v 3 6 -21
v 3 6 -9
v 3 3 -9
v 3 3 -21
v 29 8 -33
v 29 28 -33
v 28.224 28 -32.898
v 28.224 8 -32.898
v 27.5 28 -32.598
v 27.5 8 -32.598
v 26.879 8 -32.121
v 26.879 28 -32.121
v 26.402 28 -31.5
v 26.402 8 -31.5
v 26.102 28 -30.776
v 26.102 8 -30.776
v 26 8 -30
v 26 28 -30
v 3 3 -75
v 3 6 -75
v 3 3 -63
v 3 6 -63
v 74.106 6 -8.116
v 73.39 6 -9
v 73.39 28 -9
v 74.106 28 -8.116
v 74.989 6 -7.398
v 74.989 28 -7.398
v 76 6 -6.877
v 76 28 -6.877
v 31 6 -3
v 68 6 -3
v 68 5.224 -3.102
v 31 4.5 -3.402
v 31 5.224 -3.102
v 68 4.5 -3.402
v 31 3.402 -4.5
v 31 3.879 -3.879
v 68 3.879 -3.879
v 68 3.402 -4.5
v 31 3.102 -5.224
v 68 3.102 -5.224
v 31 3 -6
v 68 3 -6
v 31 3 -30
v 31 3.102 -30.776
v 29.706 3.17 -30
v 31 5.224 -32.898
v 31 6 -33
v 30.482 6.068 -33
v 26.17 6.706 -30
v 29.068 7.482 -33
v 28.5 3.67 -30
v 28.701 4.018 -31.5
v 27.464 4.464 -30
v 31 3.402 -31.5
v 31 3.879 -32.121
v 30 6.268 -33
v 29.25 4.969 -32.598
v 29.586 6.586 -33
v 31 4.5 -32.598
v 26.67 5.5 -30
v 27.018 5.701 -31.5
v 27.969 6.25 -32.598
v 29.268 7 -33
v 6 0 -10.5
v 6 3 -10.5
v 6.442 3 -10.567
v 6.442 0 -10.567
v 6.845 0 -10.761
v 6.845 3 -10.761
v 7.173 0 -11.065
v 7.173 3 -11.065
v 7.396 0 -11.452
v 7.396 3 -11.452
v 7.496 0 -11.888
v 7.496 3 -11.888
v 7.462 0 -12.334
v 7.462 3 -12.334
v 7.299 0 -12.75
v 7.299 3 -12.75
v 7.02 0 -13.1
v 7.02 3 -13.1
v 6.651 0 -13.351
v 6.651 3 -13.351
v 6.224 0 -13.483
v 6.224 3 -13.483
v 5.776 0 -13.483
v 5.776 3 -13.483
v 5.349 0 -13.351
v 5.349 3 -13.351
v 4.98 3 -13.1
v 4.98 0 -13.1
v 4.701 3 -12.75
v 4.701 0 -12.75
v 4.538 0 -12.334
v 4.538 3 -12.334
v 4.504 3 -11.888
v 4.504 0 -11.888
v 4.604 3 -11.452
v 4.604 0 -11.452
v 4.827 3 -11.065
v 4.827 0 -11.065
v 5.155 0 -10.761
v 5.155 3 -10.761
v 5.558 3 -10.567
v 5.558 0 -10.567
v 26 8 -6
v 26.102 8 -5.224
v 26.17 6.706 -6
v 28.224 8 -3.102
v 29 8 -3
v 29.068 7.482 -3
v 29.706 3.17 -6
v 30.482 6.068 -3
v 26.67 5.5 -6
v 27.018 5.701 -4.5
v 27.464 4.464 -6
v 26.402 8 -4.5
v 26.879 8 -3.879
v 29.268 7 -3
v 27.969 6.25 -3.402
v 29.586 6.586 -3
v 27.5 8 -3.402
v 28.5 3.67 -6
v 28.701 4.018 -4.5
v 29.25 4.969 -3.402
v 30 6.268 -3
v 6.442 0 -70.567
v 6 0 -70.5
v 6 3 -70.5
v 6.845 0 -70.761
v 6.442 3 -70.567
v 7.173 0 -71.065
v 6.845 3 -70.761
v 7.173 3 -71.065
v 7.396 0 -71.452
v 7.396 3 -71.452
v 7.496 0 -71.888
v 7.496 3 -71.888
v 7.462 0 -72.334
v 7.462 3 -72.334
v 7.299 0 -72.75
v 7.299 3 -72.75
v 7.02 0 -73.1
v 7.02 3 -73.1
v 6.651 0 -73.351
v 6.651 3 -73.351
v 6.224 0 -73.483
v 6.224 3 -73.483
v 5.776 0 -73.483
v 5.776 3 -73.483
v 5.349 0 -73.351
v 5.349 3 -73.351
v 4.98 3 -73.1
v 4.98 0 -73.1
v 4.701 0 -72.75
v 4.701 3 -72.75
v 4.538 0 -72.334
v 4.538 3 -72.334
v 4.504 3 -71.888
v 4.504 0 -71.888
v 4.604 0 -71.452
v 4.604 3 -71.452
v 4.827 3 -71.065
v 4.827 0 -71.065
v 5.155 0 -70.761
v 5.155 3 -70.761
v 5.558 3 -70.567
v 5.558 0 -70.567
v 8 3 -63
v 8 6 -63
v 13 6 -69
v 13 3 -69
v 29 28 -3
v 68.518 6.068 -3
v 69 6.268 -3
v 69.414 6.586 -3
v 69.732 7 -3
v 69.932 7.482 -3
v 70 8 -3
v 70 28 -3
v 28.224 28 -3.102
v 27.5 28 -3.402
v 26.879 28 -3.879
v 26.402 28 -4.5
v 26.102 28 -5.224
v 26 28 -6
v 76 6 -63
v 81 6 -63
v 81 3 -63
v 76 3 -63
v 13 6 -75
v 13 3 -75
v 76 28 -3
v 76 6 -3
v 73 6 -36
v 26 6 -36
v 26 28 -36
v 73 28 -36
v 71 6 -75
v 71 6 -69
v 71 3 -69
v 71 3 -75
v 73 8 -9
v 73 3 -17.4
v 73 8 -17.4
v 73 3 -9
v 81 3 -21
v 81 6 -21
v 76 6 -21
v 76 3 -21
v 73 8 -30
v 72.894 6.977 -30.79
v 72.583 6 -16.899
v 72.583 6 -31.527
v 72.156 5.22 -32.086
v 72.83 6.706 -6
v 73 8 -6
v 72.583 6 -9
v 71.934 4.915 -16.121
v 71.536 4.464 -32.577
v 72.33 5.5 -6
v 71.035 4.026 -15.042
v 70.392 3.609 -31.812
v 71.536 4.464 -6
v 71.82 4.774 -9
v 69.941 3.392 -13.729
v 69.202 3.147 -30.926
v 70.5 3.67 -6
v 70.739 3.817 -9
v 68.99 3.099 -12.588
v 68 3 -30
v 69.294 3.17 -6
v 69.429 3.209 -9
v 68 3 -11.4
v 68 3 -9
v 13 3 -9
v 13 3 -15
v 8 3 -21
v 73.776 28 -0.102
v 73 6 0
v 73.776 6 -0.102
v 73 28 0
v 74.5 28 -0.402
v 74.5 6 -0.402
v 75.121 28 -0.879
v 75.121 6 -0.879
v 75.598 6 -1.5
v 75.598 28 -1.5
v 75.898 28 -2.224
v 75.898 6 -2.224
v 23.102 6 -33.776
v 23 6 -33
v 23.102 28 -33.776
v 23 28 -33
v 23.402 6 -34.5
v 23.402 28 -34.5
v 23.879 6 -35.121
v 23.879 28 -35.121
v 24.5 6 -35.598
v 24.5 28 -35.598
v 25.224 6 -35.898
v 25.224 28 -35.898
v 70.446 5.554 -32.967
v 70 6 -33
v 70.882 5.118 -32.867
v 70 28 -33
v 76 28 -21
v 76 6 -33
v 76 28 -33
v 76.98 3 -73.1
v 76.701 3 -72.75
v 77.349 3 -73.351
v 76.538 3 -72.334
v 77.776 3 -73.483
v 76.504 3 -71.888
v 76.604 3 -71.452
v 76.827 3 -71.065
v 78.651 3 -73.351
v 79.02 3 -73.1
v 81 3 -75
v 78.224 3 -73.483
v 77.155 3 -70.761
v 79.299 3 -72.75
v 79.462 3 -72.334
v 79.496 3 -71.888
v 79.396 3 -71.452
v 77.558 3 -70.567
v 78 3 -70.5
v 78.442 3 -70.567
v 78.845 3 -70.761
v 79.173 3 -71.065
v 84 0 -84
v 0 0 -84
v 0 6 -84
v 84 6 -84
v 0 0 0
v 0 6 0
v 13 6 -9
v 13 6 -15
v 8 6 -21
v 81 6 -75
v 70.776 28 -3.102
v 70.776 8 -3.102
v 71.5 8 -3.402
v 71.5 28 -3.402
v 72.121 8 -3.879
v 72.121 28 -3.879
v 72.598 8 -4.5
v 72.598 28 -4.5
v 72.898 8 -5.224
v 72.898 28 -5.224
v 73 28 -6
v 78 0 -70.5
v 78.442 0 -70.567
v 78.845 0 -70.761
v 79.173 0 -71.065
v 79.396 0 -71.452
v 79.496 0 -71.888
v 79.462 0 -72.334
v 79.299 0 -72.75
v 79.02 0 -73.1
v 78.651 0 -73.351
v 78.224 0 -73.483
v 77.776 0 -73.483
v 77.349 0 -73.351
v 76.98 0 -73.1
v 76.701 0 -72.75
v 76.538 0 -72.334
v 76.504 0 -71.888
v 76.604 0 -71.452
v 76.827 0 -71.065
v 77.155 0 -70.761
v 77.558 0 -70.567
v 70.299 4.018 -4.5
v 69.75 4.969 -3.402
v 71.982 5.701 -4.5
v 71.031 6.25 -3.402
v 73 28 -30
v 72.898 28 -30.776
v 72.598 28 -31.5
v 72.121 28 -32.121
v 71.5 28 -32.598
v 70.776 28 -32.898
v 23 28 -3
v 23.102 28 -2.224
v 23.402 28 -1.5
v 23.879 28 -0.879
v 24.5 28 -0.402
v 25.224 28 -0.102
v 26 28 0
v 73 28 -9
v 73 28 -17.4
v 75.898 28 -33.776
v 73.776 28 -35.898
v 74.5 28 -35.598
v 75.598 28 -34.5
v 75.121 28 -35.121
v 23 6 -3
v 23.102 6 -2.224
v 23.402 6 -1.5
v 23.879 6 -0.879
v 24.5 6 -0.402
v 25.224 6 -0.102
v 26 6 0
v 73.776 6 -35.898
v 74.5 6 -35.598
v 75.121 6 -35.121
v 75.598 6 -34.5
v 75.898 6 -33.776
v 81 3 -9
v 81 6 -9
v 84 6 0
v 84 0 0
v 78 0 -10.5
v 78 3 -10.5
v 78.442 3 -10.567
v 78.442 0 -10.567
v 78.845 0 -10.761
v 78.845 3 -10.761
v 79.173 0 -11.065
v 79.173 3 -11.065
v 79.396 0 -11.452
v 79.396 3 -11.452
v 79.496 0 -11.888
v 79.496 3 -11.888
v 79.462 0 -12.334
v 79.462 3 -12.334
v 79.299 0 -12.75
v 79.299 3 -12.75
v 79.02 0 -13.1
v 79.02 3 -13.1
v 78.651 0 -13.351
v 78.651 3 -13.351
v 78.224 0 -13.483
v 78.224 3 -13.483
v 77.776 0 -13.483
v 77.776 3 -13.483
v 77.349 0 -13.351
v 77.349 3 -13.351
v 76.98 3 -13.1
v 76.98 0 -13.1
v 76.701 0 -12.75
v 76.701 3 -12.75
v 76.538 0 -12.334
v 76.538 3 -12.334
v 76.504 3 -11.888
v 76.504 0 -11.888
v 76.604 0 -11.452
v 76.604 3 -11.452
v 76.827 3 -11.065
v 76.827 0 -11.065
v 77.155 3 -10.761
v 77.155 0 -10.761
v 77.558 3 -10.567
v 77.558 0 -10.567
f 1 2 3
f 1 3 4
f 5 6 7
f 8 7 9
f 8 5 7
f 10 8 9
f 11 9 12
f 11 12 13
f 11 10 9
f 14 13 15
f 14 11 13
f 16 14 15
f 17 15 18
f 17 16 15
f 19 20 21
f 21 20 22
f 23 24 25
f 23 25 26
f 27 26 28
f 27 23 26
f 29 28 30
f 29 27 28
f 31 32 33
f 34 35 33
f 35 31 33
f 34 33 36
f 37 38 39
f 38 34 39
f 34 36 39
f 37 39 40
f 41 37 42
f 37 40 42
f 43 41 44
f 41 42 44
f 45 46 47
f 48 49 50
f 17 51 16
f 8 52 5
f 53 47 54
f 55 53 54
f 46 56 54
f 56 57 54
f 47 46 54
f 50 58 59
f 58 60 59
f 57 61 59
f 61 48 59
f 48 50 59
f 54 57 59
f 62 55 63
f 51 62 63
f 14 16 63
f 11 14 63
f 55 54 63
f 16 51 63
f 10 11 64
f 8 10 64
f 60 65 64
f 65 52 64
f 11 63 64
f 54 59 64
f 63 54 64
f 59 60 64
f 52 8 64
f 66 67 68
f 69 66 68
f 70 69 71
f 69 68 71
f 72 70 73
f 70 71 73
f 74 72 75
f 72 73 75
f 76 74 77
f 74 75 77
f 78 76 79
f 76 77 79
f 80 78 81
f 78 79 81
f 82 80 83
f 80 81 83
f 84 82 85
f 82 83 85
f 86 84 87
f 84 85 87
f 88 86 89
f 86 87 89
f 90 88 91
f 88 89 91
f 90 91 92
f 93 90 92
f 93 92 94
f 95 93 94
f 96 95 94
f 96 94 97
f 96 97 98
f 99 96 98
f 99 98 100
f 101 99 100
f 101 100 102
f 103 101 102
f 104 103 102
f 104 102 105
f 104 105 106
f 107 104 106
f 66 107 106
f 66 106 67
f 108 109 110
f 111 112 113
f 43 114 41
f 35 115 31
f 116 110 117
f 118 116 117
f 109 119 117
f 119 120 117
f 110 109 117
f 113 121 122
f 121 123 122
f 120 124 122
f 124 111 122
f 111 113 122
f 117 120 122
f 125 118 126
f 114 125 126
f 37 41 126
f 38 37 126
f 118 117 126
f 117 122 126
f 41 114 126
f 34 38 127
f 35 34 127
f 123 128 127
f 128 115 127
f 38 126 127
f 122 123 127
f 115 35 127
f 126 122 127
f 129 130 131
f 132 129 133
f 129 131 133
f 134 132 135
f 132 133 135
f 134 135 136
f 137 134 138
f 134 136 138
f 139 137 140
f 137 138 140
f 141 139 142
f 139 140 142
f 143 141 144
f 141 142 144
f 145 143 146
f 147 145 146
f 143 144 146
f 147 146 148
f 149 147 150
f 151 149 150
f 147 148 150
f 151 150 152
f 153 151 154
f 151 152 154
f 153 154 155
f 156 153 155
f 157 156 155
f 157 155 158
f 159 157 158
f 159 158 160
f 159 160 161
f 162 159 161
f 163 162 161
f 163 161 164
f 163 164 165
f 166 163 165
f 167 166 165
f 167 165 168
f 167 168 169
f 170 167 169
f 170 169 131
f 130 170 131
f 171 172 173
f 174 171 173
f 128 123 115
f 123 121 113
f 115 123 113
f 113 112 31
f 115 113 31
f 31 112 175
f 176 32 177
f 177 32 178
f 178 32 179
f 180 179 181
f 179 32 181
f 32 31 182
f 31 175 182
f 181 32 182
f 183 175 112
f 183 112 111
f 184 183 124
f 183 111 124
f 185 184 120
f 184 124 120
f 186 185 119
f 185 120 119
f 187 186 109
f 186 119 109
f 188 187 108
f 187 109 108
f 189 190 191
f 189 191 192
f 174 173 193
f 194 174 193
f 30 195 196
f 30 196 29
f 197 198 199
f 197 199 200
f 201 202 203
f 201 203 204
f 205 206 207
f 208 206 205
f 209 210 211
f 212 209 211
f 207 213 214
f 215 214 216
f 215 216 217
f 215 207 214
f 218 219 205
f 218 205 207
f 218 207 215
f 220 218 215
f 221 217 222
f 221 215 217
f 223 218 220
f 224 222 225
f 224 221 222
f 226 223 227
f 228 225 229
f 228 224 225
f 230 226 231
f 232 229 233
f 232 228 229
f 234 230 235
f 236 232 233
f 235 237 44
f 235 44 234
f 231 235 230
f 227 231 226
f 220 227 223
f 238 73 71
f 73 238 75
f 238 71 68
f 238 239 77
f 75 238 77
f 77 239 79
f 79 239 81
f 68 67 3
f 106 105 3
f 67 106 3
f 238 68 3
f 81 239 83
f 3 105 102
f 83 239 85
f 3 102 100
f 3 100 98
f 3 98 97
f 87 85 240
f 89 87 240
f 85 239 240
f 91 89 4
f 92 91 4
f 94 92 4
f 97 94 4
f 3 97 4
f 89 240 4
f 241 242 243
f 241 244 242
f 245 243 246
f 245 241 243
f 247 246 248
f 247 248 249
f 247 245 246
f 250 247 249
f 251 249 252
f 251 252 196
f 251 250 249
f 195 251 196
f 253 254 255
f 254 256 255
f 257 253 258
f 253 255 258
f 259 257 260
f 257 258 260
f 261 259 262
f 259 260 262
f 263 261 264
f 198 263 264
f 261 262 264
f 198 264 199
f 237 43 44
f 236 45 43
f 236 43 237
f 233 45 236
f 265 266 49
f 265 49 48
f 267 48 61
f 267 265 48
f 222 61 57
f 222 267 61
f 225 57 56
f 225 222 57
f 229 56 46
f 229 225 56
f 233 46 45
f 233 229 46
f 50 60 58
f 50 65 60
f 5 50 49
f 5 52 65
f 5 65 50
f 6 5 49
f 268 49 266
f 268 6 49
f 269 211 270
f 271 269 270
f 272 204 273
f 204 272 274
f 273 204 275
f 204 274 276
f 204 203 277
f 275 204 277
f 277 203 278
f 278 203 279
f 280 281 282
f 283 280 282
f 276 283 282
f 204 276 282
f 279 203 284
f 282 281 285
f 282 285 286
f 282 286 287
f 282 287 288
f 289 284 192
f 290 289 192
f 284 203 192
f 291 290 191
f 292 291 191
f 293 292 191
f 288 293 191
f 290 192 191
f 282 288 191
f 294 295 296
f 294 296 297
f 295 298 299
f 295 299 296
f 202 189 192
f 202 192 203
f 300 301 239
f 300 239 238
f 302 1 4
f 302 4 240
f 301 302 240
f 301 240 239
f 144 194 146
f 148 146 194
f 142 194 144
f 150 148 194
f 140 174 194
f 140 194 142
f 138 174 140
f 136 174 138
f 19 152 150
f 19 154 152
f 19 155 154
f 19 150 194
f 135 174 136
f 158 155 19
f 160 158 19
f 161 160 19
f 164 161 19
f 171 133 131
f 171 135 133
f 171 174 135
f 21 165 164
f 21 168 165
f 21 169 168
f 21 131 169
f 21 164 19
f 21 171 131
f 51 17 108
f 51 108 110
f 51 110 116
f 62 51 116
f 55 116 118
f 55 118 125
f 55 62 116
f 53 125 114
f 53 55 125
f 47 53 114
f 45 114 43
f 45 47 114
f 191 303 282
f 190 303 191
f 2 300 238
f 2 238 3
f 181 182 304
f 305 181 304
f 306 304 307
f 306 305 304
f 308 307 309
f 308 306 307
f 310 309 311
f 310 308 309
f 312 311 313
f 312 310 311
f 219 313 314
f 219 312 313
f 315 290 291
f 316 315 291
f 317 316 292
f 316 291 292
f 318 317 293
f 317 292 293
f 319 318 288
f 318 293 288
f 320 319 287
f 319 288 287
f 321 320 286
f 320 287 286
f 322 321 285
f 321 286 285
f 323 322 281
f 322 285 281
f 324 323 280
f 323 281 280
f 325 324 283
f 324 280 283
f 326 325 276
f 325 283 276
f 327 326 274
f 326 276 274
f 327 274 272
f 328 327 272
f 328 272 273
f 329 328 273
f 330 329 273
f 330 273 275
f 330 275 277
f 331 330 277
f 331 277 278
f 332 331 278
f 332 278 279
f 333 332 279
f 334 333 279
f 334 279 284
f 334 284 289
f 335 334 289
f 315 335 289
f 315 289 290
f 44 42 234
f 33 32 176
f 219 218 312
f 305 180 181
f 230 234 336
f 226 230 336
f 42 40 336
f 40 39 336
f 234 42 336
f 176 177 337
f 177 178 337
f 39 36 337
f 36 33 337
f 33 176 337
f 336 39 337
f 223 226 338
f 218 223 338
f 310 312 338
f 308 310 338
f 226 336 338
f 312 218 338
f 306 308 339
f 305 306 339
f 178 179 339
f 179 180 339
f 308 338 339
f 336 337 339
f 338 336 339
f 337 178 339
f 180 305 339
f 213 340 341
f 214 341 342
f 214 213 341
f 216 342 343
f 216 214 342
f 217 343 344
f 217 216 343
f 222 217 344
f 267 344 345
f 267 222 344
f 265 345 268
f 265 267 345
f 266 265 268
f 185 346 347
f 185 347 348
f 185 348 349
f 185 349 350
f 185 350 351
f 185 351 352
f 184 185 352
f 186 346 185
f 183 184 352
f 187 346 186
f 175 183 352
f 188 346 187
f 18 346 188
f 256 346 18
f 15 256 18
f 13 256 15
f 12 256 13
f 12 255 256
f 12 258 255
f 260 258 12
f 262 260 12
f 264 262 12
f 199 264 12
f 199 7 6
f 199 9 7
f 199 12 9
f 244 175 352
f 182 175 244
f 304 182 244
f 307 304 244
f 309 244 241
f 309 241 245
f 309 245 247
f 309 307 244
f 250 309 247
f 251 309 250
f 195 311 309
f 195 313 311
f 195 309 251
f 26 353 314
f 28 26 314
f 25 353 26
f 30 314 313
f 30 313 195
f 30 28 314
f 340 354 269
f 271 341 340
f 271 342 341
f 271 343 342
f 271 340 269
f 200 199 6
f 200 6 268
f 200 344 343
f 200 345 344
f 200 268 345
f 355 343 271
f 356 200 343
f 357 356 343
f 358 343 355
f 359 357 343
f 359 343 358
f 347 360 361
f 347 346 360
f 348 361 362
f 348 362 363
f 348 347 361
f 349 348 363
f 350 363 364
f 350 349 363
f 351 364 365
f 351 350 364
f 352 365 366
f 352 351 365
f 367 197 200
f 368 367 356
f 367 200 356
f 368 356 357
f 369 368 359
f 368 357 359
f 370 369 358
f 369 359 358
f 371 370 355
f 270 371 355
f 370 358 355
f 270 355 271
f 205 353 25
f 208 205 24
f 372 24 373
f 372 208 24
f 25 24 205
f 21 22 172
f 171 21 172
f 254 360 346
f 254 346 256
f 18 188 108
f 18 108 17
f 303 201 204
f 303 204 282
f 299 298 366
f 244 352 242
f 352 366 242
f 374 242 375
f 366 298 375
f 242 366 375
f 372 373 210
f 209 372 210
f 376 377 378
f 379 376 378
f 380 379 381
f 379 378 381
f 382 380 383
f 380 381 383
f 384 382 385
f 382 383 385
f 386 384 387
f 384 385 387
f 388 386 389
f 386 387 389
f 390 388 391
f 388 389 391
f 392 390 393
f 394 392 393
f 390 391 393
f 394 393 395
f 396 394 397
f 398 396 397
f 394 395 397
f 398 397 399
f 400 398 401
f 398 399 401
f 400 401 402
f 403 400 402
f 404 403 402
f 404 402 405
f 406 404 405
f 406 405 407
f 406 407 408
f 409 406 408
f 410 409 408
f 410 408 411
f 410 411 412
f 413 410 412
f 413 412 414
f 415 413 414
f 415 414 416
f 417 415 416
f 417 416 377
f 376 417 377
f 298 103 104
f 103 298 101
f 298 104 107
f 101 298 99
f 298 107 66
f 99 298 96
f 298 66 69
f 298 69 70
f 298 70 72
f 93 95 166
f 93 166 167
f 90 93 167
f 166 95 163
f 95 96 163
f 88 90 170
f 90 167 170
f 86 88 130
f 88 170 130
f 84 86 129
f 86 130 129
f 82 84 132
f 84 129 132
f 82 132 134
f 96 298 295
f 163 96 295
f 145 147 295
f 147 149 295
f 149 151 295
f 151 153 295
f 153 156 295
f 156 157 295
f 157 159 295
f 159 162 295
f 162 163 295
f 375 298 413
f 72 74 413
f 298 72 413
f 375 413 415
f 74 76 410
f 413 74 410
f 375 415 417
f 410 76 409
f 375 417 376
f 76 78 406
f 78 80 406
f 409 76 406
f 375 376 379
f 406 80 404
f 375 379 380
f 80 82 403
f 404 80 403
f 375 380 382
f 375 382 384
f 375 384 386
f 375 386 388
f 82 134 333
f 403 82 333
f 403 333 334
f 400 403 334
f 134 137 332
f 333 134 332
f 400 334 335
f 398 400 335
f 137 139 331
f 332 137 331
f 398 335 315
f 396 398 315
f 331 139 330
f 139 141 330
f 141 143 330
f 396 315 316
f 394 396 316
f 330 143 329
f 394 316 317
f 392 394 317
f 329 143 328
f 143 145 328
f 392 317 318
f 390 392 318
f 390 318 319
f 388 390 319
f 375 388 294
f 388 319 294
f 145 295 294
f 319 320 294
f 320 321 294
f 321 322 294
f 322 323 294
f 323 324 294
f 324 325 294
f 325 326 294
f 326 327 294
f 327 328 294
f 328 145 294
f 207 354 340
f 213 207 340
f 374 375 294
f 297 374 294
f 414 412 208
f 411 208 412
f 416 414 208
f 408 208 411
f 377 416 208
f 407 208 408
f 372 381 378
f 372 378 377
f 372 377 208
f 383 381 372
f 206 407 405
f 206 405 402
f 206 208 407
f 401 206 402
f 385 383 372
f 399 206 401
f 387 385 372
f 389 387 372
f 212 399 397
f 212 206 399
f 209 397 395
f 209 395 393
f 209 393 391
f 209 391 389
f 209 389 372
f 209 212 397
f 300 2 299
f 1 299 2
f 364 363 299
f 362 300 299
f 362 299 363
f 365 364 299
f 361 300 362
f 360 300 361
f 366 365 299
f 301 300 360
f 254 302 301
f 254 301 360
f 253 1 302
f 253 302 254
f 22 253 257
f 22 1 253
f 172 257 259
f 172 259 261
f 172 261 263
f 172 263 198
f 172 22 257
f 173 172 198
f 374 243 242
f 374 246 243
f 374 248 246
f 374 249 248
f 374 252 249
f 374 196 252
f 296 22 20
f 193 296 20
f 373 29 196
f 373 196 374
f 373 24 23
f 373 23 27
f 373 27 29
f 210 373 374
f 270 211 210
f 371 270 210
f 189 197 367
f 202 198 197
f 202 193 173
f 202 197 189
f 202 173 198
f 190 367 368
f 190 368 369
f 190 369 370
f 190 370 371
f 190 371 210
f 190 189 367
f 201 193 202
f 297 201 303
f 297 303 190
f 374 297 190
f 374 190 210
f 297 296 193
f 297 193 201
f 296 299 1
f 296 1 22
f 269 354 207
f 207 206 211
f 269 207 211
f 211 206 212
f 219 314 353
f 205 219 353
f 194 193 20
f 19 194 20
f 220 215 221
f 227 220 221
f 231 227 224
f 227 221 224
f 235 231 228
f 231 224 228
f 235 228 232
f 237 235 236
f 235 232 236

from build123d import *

# Parameters (mm, degrees)
SKETCH1_W               = 84
SKETCH1_H               = 84
BOSS_EXTRUDE1_DEPTH     = 6
SKETCH2_R               = 1.5
CUT_EXTRUDE1_DEPTH      = 119.94536561
SKETCH4_R               = 1.5
CUT_EXTRUDE4_DEPTH      = 3
MIRROR3_COPY_1_SKETCH_R = 1.5
MIRROR3_COPY_1_DEPTH    = 3
SKETCH5_W               = 53
SKETCH5_H               = 36
BOSS_EXTRUDE2_DEPTH     = 22
SKETCH6_W               = 47
SKETCH6_H               = 30
CUT_EXTRUDE5_DEPTH      = 25
FILLET1_R               = 3
FILLET2_R               = 5
BOSS_EXTRUDE3_START     = -17.4
BOSS_EXTRUDE3_DEPTH     = 8.4
CUT_EXTRUDE14_START     = -22
CUT_EXTRUDE14_DEPTH     = 22
CUT_EXTRUDE15_DEPTH     = 122.396046085


# Read off the part's stored shape, not the designer's step: Boss-Extrude3
with BuildPart() as part:
    # Sketch1 → Boss-Extrude1 (new body)
    with BuildSketch(Plane(origin=(0, 0, 0), x_dir=(1, 0, 0), z_dir=(0, 1, 0))):
        with Locations((42, 42)):
            Rectangle(SKETCH1_W, SKETCH1_H)
    extrude(amount=BOSS_EXTRUDE1_DEPTH)

    # Sketch2 → Cut-Extrude1 (cut, through all)
    with BuildSketch(Plane(origin=(0, 6, 0), x_dir=(1, 0, 0), z_dir=(0, 1, 0))):
        with Locations(Location((6, 72, 0), (0, 0, 270))):
            Circle(SKETCH2_R)
        with Locations(Location((6, 12, 0), (0, 0, 270))):
            Circle(SKETCH2_R)
        with Locations(Location((78, 12, 0), (0, 0, 270))):
            Circle(SKETCH2_R)
        with Locations(Location((78, 72, 0), (0, 0, 270))):
            Circle(SKETCH2_R)
    extrude(amount=-CUT_EXTRUDE1_DEPTH, mode=Mode.SUBTRACT)

    # Sketch4 → Cut-Extrude4 (cut)
    with BuildSketch(Plane(origin=(0, 6, 0), x_dir=(1, 0, 0), z_dir=(0, 1, 0))):
        Polygon((13, 15), (13, 9), (3, 9), (3, 21), (8, 21), align=None)
        with Locations(Location((6, 12, 0), (0, 0, 270))):
            Circle(SKETCH4_R, mode=Mode.SUBTRACT)
    cut_extrude4 = extrude(amount=-CUT_EXTRUDE4_DEPTH, mode=Mode.SUBTRACT)

    # Mirror2: Cut-Extrude4 across plane
    add(cut_extrude4.mirror(Plane.XY.offset(-42)), mode=Mode.SUBTRACT)

    # Mirror3: Cut-Extrude4 across plane
    add(cut_extrude4.mirror(Plane.ZY.offset(-42)), mode=Mode.SUBTRACT)

    # Mirror3 copy 1 sketch → Mirror3 copy 1 (cut)
    with BuildSketch(Plane(origin=(84, 6, -84), x_dir=(-1, 0, 0), z_dir=(0, 1, 0))):
        Polygon((13, 15), (13, 9), (3, 9), (3, 21), (8, 21), align=None)
        with Locations(Location((6, 12, 0), (0, 0, 270))):
            Circle(MIRROR3_COPY_1_SKETCH_R, mode=Mode.SUBTRACT)
    extrude(amount=-MIRROR3_COPY_1_DEPTH, mode=Mode.SUBTRACT)

    # Sketch5 → Boss-Extrude2 (add)
    with BuildSketch(Plane(origin=(0, 6, 0), x_dir=(1, 0, 0), z_dir=(0, 1, 0))):
        with Locations((49.5, 18)):
            Rectangle(SKETCH5_W, SKETCH5_H)
    extrude(amount=BOSS_EXTRUDE2_DEPTH)

    # Sketch6 → Cut-Extrude5 (cut)
    with BuildSketch(Plane(origin=(0, 28, 0), x_dir=(1, 0, 0), z_dir=(0, 1, 0))):
        with Locations((49.5, 18)):
            Rectangle(SKETCH6_W, SKETCH6_H)
    extrude(amount=-CUT_EXTRUDE5_DEPTH, mode=Mode.SUBTRACT)

    # Fillet1
    fillet1_edges = [part.edges().sort_by_distance(p)[0] for p in [
        (76, 17, -36),
        (23, 17, -36),
        (23, 17, 0),
        (76, 17, 0),
        (73, 15.5, -33),
        (49.5, 3, -3),
        (73, 15.5, -3),
        (26, 15.5, -3),
        (49.5, 3, -33),
        (26, 15.5, -33),
    ]]
    fillet(fillet1_edges, radius=FILLET1_R)

    # Fillet2
    # the kernel refuses this fillet: 5 mm, written as the material it adds along each edge
    with BuildSketch(Plane(origin=(31, 8, -3), x_dir=(-1, 0, 0), z_dir=(0, 1, 0))) as fillet2_piece_1:
        with BuildLine():
            CenterArc((2, -3), 3, 0, 90)
            Line((5, -3), (5, 0))
            Line((5, 0), (2, 0))
        make_face()
    revolve(axis=Axis((31, 8, -3), (0, 0, 1)), revolution_arc=90)
    with BuildSketch(Plane(origin=(31, 8, -33), x_dir=(0, -1, 0), z_dir=(1, 0, 0))) as fillet2_piece_2:
        with BuildLine():
            CenterArc((2, -3), 3, 0, 90)
            Line((5, -3), (5, 0))
            Line((5, 0), (2, 0))
        make_face()
    revolve(axis=Axis((31, 8, -33), (0, 0, -1)), revolution_arc=90)
    with BuildSketch(Plane(origin=(68, 8, -3), x_dir=(0, -1, 0), z_dir=(-1, 0, 0))) as fillet2_piece_3:
        with BuildLine():
            CenterArc((2, -3), 3, 0, 90)
            Line((5, -3), (5, 0))
            Line((5, 0), (2, 0))
        make_face()
    revolve(axis=Axis((68, 8, -3), (0, 0, 1)), revolution_arc=90)
    with BuildSketch(Plane(origin=(73, 3, -4.9), x_dir=(-1, 0, 0), z_dir=(0, 0, -1))) as fillet2_piece_4_section:
        with BuildLine():
            CenterArc((FILLET2_R, FILLET2_R), FILLET2_R, 180, 90)
            Line((0, FILLET2_R), (0, 0))
            Line((0, 0), (FILLET2_R, 0))
        make_face()
    fillet2_piece_4 = extrude(amount=37.6, mode=Mode.PRIVATE)
    fillet2_piece_4 = split(fillet2_piece_4, bisect_by=Plane(origin=(71.840443932, 4.051726495, -9), z_dir=(0, 0, 1)), keep=Keep.TOP, mode=Mode.PRIVATE)
    add(fillet2_piece_4)
    with BuildSketch(Plane(origin=(73, 3, -4.9), x_dir=(-1, 0, 0), z_dir=(0, 0, -1))) as fillet2_piece_5_section:
        with BuildLine():
            CenterArc((FILLET2_R, FILLET2_R), FILLET2_R, 180, 90)
            Line((0, FILLET2_R), (0, 0))
            Line((0, 0), (FILLET2_R, 0))
        make_face()
    fillet2_piece_5 = extrude(amount=37.6, mode=Mode.PRIVATE)
    fillet2_piece_5 = split(fillet2_piece_5, bisect_by=Plane(origin=(72.877053979, 6.49875804, -36), z_dir=(0, 0, 1)), keep=Keep.TOP, mode=Mode.PRIVATE)
    fillet2_piece_5 = split(fillet2_piece_5, bisect_by=Plane(origin=(72.877053979, 6, -13.126232387), z_dir=(0, 1, 0)), keep=Keep.TOP, mode=Mode.PRIVATE)
    add(fillet2_piece_5)
    with BuildSketch(Plane(origin=(73, 3, -4.9), x_dir=(-1, 0, 0), z_dir=(0, 0, -1))) as fillet2_piece_6_section:
        with BuildLine():
            CenterArc((FILLET2_R, FILLET2_R), FILLET2_R, 180, 90)
            Line((0, FILLET2_R), (0, 0))
            Line((0, 0), (FILLET2_R, 0))
        make_face()
    fillet2_piece_6 = extrude(amount=37.6, mode=Mode.PRIVATE)
    fillet2_piece_6 = split(fillet2_piece_6, bisect_by=Plane(origin=(74.593810092, 3.935909556, -19.312572111), z_dir=(-0.7682212795973755, 0, -0.6401843996644804)), keep=Keep.TOP, mode=Mode.PRIVATE)
    fillet2_piece_6 = split(fillet2_piece_6, bisect_by=Plane(origin=(71.754876355, 6, -21.678350226), z_dir=(0, -1, 0)), keep=Keep.TOP, mode=Mode.PRIVATE)
    add(fillet2_piece_6)
    with BuildSketch(Plane(origin=(73, 3, -3), x_dir=(-1, 0, 0), z_dir=(0, 0, -1))) as fillet2_piece_7:
        with BuildLine():
            CenterArc((FILLET2_R, FILLET2_R), FILLET2_R, 180, 90)
            Line((0, FILLET2_R), (0, 0))
            Line((0, 0), (FILLET2_R, 0))
        make_face()
    extrude(amount=6)
    with BuildSketch(Plane(origin=(73, 3, -3), x_dir=(-1, 0, 0), z_dir=(0, 0, -1))) as fillet2_piece_8_section:
        with BuildLine():
            CenterArc((FILLET2_R, FILLET2_R), FILLET2_R, 180, 90)
            Line((0, FILLET2_R), (0, 0))
            Line((0, 0), (FILLET2_R, 0))
        make_face()
    fillet2_piece_8 = extrude(amount=18.5, mode=Mode.PRIVATE)
    fillet2_piece_8 = split(fillet2_piece_8, bisect_by=Plane(origin=(72.877053979, 6, -13.126232386), z_dir=(0, 1, 0)), keep=Keep.TOP, mode=Mode.PRIVATE)
    add(fillet2_piece_8)
    with BuildSketch(Plane(origin=(73, 3, -3), x_dir=(-1, 0, 0), z_dir=(0, 0, -1))) as fillet2_piece_9_section:
        with BuildLine():
            CenterArc((FILLET2_R, FILLET2_R), FILLET2_R, 180, 90)
            Line((0, FILLET2_R), (0, 0))
            Line((0, 0), (FILLET2_R, 0))
        make_face()
    fillet2_piece_9 = extrude(amount=18.5, mode=Mode.PRIVATE)
    fillet2_piece_9 = split(fillet2_piece_9, bisect_by=Plane(origin=(73.049643728, 3.899661729, -17.459572473), z_dir=(-0.7682212795973755, 0, -0.6401843996644804)), keep=Keep.TOP, mode=Mode.PRIVATE)
    add(fillet2_piece_9)
    with BuildSketch(Plane(origin=(26, 3, -33), x_dir=(1, 0, 0), z_dir=(0, 0, 1))) as fillet2_piece_10:
        with BuildLine():
            CenterArc((FILLET2_R, FILLET2_R), FILLET2_R, 180, 90)
            Line((0, FILLET2_R), (0, 0))
            Line((0, 0), (FILLET2_R, 0))
        make_face()
    extrude(amount=30)

    # Boss-Extrude3 outline → Boss-Extrude3 (add)
    with BuildSketch(Plane.XY.offset(BOSS_EXTRUDE3_START)):
        with BuildLine():
            Line((73, 6), (72.582575695, 6))
            ThreePointArc((72.582575695, 6), (70.738612788, 3.816699867), (68, 3))
            Line((68, 3), (73, 3))
            Line((73, 3), (73, 6))
        make_face()
    extrude(amount=BOSS_EXTRUDE3_DEPTH)

    # Sketch8 → Cut-Extrude14 (cut)
    with BuildSketch(Plane(origin=(0, 28, 0), x_dir=(1, 0, 0), z_dir=(0, 1, 0)).offset(CUT_EXTRUDE14_START)):
        with BuildLine():
            Line((76, 9), (76, 17.123475383))
            ThreePointArc((76, 17.123475383), (74.22437799, 15.99933475), (73, 14.291287847))
            Line((73, 14.291287847), (73, 9.708712153))
            ThreePointArc((73, 9.708712153), (73.182064882, 9.347171095), (73.390227771, 9))
            Line((73.390227771, 9), (76, 9))
        make_face()
        with BuildLine():
            Line((76, 6.876524617), (76, 9))
            Line((76, 9), (73.390227771, 9))
            ThreePointArc((73.390227771, 9), (74.528752508, 7.733802531), (76, 6.876524617))
        make_face()
    extrude(amount=CUT_EXTRUDE14_DEPTH, mode=Mode.SUBTRACT)

    # Sketch13 → Cut-Extrude15 (cut, through all)
    with BuildSketch(Plane(origin=(0, 3, 0), x_dir=(1, 0, 0), z_dir=(0, 1, 0))):
        Polygon((73, 17.4), (73, 9), (81, 9), (81, 21), (76, 21), align=None)
    extrude(amount=CUT_EXTRUDE15_DEPTH, mode=Mode.SUBTRACT)


solid = part.part
